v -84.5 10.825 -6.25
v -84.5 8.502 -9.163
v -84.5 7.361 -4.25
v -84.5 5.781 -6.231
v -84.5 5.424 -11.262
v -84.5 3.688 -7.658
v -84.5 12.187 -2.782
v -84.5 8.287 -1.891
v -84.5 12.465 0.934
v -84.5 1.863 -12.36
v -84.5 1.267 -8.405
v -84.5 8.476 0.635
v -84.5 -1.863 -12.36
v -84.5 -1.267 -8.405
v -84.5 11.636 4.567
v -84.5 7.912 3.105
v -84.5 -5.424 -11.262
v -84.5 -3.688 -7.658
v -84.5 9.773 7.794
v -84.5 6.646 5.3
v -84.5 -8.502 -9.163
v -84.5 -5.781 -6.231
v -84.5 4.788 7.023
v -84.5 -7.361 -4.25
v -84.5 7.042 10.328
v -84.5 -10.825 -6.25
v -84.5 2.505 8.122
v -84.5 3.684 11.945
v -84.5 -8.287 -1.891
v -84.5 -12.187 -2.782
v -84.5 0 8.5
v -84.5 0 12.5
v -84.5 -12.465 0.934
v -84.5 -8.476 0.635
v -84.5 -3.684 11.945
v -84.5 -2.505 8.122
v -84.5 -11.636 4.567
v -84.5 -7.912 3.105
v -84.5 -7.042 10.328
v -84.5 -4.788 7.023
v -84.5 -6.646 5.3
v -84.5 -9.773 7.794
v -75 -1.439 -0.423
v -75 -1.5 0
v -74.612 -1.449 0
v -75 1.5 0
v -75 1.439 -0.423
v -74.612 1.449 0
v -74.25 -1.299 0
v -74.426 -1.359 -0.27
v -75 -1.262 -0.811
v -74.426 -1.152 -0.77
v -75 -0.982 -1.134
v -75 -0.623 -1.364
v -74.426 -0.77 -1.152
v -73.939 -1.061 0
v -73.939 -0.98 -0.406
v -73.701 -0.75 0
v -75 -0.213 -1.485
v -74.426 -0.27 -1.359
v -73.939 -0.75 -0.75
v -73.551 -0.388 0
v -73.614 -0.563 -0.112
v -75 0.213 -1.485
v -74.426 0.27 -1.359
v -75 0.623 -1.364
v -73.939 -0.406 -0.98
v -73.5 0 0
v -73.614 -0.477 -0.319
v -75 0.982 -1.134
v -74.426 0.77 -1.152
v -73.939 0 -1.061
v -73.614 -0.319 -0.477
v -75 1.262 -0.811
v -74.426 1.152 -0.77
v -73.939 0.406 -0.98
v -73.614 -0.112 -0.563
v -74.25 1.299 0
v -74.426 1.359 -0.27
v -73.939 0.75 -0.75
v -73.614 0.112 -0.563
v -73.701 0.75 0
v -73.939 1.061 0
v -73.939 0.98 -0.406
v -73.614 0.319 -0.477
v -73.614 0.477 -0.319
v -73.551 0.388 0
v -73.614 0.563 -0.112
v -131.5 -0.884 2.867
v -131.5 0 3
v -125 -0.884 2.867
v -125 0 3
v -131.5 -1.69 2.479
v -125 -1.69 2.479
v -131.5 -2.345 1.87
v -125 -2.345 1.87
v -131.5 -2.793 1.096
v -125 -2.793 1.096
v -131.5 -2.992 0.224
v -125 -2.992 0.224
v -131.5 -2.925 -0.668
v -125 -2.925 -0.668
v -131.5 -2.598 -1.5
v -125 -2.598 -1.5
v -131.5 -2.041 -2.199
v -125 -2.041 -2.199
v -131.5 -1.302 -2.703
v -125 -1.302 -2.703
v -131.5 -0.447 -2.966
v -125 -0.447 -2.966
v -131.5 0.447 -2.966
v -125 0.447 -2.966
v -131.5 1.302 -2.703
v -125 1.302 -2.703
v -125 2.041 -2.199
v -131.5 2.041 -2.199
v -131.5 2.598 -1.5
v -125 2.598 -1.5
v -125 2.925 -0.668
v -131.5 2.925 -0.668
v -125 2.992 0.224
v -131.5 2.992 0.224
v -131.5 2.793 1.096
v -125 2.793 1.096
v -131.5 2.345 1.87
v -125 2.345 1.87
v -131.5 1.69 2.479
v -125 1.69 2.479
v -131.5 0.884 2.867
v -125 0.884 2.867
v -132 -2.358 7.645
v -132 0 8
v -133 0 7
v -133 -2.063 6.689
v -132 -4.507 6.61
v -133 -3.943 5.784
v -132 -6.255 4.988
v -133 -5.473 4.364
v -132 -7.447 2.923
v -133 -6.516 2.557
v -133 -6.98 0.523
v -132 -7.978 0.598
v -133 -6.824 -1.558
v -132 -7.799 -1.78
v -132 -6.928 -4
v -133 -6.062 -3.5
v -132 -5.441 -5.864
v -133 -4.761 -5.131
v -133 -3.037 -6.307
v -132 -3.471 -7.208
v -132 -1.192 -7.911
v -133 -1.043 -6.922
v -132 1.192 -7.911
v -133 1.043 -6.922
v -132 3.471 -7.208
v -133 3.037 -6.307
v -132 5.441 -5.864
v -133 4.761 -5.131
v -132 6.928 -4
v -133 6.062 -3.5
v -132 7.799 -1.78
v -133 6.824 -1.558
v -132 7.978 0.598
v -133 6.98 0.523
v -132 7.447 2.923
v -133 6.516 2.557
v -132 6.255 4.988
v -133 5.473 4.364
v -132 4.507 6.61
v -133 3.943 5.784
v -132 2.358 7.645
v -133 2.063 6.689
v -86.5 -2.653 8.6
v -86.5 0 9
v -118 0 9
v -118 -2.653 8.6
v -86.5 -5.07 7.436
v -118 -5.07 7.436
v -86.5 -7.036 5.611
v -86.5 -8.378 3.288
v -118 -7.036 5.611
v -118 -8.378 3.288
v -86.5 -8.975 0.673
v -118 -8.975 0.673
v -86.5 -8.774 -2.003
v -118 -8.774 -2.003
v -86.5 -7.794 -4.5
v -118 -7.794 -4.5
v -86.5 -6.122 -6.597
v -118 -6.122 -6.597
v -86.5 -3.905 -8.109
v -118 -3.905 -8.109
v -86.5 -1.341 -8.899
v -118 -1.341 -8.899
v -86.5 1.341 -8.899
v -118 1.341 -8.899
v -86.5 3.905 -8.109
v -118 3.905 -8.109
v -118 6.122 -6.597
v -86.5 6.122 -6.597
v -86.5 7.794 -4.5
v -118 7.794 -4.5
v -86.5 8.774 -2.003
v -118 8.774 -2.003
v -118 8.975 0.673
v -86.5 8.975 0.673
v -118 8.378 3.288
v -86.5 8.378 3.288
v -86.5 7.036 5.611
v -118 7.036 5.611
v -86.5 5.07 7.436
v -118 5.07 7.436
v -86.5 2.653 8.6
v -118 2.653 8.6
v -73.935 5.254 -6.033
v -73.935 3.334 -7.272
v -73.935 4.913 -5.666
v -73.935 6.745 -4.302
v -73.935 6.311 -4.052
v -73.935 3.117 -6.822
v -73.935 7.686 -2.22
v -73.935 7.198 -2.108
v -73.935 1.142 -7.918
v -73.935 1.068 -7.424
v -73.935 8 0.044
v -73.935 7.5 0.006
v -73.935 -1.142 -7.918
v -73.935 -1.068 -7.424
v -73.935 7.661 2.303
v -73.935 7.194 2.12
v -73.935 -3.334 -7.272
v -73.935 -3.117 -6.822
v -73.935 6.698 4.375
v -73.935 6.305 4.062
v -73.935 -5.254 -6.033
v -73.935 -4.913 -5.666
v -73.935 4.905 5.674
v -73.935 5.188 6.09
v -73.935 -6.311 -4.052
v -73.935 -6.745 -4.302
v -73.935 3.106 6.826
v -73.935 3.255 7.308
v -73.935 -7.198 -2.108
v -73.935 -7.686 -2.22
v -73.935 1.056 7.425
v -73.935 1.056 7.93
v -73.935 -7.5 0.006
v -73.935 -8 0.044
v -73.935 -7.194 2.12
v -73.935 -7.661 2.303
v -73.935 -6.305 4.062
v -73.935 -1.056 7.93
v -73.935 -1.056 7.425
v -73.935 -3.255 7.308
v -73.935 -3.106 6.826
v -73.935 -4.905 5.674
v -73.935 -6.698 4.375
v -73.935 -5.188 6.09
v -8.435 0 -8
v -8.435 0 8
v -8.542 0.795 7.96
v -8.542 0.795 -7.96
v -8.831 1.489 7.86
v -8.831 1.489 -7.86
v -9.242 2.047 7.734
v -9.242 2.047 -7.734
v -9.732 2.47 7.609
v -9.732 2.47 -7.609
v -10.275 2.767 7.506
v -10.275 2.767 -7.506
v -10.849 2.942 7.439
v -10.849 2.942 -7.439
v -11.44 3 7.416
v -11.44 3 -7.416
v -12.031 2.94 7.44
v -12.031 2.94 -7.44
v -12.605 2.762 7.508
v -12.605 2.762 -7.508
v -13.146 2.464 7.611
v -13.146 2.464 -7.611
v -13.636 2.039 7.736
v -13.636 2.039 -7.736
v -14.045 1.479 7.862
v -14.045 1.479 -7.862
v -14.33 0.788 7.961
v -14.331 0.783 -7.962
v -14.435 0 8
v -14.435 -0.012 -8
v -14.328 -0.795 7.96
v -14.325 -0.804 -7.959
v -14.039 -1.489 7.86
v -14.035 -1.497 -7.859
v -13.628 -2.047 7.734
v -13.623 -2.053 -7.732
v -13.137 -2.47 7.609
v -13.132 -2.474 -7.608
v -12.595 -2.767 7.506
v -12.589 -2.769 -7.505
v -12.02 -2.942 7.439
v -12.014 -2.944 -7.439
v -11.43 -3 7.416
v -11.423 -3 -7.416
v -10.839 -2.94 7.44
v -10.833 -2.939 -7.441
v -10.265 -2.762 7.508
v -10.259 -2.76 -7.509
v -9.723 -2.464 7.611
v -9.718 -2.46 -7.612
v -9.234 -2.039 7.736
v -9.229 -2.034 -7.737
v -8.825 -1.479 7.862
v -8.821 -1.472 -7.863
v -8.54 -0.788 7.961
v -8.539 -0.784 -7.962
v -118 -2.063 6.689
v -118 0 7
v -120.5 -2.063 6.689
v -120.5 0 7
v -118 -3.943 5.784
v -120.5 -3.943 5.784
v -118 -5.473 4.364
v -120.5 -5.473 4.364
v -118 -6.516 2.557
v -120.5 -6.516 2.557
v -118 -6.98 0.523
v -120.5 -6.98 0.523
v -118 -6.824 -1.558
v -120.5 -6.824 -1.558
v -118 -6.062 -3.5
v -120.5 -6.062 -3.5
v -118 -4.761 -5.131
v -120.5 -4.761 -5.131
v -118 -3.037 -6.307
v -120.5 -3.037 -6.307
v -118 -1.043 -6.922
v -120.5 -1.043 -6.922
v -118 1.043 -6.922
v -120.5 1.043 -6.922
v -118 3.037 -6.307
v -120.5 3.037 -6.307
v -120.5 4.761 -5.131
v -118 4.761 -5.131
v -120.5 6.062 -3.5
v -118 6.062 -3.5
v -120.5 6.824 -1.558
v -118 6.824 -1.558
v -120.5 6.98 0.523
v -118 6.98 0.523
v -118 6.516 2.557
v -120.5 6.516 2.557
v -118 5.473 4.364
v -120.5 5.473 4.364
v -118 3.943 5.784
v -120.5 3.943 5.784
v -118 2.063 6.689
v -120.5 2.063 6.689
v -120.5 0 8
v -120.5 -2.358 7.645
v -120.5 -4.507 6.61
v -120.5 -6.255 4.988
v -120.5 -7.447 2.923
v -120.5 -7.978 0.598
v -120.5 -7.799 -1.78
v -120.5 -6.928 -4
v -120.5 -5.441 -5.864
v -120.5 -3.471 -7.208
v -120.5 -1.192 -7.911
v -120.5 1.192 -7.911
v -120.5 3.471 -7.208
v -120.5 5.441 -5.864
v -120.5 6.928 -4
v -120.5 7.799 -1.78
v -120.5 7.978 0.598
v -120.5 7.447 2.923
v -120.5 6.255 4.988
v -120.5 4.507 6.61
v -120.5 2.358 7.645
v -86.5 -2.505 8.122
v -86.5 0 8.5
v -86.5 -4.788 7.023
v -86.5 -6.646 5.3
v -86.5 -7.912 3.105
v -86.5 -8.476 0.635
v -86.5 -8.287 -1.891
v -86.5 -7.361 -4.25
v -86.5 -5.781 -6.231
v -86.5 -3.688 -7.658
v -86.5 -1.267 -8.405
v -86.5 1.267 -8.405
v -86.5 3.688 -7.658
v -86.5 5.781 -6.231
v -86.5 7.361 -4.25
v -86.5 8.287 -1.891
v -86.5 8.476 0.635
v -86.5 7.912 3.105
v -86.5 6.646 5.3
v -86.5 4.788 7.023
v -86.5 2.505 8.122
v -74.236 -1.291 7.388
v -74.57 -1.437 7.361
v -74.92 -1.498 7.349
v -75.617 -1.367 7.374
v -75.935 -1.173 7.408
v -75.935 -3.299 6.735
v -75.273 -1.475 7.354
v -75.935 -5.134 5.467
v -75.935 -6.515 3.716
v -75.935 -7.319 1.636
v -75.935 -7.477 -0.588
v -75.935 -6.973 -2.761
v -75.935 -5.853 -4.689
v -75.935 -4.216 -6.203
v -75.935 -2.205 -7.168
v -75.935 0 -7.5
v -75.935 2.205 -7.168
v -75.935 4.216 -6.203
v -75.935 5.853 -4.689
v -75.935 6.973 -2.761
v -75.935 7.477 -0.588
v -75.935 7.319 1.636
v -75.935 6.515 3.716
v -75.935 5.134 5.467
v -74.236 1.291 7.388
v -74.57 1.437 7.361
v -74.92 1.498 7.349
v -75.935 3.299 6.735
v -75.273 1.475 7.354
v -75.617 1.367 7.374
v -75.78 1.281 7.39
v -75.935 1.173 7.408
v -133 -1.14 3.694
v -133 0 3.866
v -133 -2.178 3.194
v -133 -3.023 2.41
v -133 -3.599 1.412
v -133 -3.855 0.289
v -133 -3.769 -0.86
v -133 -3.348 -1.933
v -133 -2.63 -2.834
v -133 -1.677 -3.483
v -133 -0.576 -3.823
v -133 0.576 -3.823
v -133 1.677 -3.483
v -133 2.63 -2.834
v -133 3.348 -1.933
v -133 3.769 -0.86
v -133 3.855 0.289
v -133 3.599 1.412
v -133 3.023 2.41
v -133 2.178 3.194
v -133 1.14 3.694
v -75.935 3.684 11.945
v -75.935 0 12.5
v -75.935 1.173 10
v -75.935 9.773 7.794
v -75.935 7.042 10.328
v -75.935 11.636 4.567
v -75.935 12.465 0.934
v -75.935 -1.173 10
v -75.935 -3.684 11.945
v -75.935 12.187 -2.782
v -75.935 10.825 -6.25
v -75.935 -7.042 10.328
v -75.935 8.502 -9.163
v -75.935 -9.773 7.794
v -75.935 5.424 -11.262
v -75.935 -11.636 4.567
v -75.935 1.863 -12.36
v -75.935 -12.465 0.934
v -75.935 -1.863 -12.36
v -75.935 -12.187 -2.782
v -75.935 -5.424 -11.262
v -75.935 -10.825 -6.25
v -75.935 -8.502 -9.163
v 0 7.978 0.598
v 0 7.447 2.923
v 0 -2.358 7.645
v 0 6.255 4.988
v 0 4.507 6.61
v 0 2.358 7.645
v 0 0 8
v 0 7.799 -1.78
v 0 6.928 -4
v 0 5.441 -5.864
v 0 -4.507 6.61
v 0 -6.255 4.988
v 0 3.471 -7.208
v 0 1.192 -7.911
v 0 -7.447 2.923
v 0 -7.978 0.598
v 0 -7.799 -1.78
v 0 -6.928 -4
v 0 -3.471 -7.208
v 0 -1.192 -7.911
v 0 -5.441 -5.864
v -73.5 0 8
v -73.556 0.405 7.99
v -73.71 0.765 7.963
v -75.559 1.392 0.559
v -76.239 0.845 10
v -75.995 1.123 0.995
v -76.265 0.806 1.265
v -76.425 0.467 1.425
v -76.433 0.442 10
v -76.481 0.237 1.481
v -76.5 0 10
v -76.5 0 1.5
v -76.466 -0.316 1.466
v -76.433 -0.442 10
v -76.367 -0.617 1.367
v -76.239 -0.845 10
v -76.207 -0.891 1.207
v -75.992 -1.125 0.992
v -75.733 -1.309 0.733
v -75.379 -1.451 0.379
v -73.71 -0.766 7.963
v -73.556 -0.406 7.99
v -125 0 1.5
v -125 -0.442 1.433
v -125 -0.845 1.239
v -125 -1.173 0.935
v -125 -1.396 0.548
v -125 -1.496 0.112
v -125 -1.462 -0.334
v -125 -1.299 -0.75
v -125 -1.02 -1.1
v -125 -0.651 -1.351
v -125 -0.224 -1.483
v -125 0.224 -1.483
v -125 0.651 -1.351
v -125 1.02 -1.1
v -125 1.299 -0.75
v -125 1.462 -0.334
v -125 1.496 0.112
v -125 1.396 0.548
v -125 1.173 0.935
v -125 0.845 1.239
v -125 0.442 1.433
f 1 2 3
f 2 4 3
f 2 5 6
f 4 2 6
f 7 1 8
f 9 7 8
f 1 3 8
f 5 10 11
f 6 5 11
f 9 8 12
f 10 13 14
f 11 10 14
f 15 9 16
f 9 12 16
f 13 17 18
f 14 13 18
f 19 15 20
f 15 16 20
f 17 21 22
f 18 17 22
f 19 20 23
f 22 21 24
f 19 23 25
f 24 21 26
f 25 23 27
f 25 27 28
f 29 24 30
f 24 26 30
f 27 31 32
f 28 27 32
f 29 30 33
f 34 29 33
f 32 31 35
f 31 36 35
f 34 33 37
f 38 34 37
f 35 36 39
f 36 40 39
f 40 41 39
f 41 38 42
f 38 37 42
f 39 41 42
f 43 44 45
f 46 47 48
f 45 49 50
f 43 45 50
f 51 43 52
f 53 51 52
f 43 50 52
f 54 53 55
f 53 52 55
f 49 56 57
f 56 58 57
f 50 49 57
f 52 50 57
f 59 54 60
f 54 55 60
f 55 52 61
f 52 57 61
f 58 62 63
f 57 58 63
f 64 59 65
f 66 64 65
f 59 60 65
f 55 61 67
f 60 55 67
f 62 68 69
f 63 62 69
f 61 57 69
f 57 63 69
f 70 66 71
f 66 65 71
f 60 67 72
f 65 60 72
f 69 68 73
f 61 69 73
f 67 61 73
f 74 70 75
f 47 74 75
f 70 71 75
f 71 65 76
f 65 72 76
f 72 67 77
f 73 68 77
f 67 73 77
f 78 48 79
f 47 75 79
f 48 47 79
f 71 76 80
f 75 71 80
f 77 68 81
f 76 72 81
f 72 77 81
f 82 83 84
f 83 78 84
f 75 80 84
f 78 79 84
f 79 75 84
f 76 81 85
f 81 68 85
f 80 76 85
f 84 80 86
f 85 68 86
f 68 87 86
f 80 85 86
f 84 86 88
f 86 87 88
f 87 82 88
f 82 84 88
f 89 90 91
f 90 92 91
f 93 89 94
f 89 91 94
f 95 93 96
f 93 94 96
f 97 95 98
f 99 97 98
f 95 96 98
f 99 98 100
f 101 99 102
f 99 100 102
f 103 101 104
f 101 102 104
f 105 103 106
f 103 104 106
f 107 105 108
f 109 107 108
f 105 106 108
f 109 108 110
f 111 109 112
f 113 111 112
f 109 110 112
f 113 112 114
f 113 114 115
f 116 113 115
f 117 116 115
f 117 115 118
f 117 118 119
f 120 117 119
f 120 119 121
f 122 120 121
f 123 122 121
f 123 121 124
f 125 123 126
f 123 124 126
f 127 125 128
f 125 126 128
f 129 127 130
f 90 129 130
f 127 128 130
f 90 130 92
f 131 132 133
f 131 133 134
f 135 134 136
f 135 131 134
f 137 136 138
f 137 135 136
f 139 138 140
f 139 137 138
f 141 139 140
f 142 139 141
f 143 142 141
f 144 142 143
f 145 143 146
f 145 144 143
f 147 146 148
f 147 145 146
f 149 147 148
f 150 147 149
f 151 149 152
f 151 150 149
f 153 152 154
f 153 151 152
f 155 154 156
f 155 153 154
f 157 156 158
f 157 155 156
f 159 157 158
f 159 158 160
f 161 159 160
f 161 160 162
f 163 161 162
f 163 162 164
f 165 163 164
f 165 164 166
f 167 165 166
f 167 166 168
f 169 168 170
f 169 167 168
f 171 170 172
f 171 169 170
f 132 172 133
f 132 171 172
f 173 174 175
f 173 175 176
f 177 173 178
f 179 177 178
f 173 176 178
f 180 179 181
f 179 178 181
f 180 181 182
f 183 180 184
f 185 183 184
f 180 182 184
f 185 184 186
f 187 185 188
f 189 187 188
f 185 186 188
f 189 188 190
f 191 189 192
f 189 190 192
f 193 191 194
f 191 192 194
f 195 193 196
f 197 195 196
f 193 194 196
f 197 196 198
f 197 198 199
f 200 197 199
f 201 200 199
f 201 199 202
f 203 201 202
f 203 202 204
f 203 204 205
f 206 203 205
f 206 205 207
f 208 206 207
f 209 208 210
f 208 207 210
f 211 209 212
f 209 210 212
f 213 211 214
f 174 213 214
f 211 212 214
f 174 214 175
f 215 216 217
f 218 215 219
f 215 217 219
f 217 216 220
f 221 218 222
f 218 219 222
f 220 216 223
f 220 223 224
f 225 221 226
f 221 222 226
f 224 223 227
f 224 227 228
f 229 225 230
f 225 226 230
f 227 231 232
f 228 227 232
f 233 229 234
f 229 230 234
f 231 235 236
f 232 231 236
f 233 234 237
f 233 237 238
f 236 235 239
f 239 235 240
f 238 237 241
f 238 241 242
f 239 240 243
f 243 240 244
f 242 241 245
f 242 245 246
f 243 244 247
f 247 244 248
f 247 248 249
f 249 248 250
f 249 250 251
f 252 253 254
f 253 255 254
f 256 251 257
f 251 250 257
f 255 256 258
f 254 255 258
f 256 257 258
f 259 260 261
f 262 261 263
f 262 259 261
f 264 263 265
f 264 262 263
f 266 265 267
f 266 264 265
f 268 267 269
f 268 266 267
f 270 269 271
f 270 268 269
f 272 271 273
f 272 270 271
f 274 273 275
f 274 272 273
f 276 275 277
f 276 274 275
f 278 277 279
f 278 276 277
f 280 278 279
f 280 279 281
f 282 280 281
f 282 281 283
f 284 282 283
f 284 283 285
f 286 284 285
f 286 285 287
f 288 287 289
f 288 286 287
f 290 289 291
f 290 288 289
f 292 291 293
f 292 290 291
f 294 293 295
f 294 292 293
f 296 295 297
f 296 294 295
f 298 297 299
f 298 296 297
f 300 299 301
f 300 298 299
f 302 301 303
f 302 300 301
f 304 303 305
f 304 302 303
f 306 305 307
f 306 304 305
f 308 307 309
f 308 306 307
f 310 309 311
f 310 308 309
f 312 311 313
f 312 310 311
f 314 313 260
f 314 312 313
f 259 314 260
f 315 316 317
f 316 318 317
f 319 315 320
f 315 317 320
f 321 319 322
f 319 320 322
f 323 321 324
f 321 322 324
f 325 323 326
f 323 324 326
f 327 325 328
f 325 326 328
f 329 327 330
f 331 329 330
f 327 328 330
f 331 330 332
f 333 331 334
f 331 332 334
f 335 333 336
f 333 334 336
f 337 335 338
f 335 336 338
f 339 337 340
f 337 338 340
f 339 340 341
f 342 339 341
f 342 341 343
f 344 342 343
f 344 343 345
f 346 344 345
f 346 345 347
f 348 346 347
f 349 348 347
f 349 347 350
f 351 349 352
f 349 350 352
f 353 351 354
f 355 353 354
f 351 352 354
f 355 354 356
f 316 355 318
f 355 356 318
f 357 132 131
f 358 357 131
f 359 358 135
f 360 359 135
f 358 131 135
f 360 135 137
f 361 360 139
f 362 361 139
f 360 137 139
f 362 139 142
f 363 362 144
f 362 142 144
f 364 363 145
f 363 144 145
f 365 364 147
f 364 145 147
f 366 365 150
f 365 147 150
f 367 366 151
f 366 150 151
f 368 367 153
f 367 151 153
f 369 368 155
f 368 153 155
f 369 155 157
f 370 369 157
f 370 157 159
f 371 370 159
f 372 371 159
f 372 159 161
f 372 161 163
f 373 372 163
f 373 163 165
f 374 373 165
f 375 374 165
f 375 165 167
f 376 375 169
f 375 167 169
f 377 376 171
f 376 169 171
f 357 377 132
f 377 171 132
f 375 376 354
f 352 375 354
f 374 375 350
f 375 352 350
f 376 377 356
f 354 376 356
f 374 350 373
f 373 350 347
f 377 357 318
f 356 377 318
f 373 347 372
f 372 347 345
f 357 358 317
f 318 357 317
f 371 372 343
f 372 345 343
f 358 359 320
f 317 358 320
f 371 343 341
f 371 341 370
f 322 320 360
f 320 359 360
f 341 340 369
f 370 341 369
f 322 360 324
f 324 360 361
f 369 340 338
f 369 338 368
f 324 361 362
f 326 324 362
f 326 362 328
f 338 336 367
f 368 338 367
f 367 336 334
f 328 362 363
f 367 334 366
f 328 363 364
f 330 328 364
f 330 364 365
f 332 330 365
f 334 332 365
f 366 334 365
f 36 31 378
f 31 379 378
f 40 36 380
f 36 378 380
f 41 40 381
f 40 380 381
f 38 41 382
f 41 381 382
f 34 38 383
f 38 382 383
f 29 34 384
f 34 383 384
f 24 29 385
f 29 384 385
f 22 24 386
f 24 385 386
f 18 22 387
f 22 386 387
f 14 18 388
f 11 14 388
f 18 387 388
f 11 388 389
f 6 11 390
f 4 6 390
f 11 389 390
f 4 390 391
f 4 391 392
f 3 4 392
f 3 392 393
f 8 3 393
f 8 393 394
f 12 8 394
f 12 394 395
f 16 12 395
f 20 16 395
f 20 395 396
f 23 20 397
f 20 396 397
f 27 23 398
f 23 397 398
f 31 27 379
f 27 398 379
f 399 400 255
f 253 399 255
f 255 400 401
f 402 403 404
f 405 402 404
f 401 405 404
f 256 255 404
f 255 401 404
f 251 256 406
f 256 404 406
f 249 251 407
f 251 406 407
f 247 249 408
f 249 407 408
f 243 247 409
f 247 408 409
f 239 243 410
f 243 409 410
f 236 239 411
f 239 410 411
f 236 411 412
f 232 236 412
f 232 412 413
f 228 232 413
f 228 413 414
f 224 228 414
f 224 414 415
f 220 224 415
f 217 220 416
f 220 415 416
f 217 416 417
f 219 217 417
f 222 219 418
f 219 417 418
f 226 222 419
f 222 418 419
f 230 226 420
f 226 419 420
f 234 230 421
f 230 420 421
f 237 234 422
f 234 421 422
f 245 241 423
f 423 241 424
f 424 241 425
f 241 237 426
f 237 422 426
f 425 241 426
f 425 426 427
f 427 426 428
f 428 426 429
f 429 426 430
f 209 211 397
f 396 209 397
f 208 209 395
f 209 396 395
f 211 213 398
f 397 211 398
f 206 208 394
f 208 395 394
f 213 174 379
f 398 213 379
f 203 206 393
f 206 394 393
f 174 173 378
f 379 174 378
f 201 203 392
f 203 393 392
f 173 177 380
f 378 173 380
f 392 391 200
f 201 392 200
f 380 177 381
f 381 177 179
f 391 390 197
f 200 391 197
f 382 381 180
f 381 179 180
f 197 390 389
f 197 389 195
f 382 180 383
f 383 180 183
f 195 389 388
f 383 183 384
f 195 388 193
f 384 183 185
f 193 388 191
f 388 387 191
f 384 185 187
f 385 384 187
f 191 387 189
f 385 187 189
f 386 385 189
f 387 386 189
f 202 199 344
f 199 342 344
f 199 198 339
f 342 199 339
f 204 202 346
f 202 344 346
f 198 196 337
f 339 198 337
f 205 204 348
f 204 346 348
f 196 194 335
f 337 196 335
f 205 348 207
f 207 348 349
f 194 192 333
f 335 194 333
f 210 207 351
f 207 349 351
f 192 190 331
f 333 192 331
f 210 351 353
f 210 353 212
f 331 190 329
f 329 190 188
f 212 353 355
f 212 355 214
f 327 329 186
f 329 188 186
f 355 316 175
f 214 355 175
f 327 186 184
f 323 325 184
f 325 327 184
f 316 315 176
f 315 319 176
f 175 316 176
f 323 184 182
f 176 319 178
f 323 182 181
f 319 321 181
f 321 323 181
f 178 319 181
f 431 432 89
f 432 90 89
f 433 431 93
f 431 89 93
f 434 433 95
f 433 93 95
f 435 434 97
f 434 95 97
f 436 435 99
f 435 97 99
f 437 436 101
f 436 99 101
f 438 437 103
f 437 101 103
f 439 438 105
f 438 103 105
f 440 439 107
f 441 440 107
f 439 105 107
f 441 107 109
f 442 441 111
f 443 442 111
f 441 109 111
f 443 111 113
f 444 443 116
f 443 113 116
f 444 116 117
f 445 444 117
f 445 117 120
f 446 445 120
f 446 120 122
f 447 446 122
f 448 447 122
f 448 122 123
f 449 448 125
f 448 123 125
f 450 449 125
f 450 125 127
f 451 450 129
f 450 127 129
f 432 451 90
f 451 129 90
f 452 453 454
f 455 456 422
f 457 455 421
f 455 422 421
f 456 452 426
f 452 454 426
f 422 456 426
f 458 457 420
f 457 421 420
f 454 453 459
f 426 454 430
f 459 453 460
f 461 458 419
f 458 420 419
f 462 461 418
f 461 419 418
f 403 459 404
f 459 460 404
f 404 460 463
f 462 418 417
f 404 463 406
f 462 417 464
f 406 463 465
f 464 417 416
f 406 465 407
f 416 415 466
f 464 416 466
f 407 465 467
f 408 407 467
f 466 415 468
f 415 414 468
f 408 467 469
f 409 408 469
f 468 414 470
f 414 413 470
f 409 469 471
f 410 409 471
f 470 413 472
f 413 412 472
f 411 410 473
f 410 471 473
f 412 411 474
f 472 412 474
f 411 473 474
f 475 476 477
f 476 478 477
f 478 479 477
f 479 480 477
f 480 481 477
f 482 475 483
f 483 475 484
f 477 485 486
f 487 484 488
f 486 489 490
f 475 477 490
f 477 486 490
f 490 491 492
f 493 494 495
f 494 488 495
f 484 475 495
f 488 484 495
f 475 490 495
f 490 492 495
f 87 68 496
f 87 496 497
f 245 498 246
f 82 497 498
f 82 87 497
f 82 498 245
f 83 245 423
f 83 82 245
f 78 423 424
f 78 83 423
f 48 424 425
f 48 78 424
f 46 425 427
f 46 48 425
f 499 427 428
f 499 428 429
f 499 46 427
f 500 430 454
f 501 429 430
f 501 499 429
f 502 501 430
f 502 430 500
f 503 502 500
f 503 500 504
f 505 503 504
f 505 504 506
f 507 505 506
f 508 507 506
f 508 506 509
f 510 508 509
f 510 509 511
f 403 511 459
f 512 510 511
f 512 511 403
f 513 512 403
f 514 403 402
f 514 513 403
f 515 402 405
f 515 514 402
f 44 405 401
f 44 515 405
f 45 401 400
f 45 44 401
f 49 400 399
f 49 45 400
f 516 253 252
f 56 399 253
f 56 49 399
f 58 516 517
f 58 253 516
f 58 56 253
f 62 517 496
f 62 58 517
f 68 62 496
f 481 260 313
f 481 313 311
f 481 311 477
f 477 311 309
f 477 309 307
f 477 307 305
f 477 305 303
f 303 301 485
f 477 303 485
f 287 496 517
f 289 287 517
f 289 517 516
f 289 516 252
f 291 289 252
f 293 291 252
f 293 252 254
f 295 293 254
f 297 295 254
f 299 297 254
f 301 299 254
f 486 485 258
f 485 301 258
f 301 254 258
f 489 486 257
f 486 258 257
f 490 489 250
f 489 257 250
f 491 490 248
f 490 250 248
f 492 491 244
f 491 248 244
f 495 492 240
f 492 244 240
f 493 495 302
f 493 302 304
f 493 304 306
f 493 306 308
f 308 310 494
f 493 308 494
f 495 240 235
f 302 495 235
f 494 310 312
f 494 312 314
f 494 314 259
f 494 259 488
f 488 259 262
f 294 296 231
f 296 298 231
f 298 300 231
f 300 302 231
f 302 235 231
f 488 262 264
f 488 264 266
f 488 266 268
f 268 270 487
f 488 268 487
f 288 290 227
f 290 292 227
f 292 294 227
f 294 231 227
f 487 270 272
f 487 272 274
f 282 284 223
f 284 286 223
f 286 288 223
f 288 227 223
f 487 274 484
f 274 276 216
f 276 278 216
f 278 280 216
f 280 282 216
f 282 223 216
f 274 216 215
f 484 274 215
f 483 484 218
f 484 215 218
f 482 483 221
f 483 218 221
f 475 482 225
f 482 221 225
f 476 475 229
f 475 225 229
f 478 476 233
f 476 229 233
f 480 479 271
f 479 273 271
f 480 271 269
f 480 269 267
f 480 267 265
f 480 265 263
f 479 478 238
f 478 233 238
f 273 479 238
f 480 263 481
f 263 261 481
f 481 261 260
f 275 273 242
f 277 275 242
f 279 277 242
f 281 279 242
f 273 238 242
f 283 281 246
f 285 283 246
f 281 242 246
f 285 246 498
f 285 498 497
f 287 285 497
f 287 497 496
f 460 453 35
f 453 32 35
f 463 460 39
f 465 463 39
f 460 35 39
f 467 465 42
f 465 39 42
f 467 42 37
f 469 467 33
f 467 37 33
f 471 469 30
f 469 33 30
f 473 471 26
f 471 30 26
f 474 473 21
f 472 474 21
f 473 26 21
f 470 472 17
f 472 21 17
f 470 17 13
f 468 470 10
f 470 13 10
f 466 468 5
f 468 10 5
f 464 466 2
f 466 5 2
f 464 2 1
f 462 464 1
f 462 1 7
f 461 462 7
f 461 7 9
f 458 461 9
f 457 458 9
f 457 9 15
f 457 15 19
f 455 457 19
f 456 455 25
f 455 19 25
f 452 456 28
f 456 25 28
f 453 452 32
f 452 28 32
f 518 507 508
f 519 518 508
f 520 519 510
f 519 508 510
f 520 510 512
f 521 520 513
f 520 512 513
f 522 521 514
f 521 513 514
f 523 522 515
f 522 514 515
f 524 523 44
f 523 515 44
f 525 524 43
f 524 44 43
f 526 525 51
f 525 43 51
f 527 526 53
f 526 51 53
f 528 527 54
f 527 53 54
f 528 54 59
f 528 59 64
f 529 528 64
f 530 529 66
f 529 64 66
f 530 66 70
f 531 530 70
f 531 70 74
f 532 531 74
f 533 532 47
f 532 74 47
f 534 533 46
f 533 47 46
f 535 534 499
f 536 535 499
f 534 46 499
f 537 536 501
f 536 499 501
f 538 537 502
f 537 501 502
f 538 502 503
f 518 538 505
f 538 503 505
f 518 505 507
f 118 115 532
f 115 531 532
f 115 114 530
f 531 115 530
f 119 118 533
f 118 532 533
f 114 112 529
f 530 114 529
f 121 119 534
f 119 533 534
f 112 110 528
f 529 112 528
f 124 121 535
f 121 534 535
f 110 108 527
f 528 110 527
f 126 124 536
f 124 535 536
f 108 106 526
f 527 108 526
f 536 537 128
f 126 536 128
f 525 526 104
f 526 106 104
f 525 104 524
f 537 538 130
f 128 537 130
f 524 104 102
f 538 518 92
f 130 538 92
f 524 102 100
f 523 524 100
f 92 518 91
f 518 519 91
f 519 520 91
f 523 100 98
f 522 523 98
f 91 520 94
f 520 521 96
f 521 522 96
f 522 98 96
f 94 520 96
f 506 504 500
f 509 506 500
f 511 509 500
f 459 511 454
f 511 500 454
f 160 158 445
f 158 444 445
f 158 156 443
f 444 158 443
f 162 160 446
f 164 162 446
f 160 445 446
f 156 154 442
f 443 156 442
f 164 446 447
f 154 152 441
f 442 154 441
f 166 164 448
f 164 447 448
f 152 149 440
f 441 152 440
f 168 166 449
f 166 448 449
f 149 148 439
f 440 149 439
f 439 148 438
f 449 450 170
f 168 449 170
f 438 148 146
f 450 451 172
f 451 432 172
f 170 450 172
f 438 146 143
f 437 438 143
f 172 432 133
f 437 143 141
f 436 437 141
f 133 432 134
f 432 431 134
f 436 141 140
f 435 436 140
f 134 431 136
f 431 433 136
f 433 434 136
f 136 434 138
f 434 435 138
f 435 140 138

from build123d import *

# Parameters (mm, degrees)
CUT_EXTRUDE_1_DEPTH      = 135.169668703
CUT_EXTRUDE_1_DEPTH_BACK = 135.169668703
SKETCH_4_R               = 3
SKETCH_5_R               = 1.5
CUT_EXTRUDE_2_DEPTH      = 10
CHAMFER_1_SIZE           = 1


with BuildPart() as part:
    # 草图1 → 旋转1 (revolve)
    with BuildSketch(Plane.XY, mode=Mode.PRIVATE) as revolve_1_sk:
        Polygon((0, 0), (0, 8), (-73.934886909, 8), (-73.934886909, 7.5), (-75.934886909, 7.5), (-75.934886909, 12.5), (-84.5, 12.5), (-84.5, 8.5), (-86.5, 8.5), (-86.5, 9), (-118, 9), (-118, 7), (-120.5, 7), (-120.5, 8), (-133, 8), (-133, 0), align=None)
    revolve(revolve_1_sk.sketch.rotate(Axis((0, 0, 0), (1, 0, 0)), 90), axis=Axis((0, 0, 0), (1, 0, 0)))

    # 草图3 → 切除-旋转3 (revolve, cut)
    with BuildSketch(Plane.XY, mode=Mode.PRIVATE) as cut_revolve_3_sk:
        with BuildLine():
            Line((-133, 3.866025404), (-131.5, 3))
            Line((-131.5, 3), (-125, 3))
            Line((-125, 3), (-125, 1.5))
            Line((-125, 1.5), (-75, 1.5))
            ThreePointArc((-75, 1.5), (-73.939339828, 1.060660172), (-73.5, 0))
            Line((-73.5, 0), (-133, 0))
            Line((-133, 0), (-133, 3.866025404))
        make_face()
    revolve(cut_revolve_3_sk.sketch.rotate(Axis((-133, 0, 0), (1, 0, 0)), 90), axis=Axis((-133, 0, 0), (1, 0, 0)), mode=Mode.SUBTRACT)

    # 草图4 → 切除-拉伸1 (cut, two sides: drawn at the far end of the back side and taken through both)
    with BuildSketch(Plane.XY.offset(-CUT_EXTRUDE_1_DEPTH_BACK)):
        with Locations((-11.434886909, 0)):
            Circle(SKETCH_4_R)
    extrude(amount=CUT_EXTRUDE_1_DEPTH + CUT_EXTRUDE_1_DEPTH_BACK, mode=Mode.SUBTRACT)

    # 草图5 → 切除-拉伸2 (cut)
    with BuildSketch(Plane.XY):
        with Locations((-75, 0)):
            Circle(SKETCH_5_R)
    extrude(amount=CUT_EXTRUDE_2_DEPTH, mode=Mode.SUBTRACT)

    # 倒角1
    chamfer_1_edges = [part.edges().sort_by_distance(p)[0] for p in [
        (-133, 0, -8),
    ]]
    chamfer(chamfer_1_edges, length=CHAMFER_1_SIZE)


solid = part.part
